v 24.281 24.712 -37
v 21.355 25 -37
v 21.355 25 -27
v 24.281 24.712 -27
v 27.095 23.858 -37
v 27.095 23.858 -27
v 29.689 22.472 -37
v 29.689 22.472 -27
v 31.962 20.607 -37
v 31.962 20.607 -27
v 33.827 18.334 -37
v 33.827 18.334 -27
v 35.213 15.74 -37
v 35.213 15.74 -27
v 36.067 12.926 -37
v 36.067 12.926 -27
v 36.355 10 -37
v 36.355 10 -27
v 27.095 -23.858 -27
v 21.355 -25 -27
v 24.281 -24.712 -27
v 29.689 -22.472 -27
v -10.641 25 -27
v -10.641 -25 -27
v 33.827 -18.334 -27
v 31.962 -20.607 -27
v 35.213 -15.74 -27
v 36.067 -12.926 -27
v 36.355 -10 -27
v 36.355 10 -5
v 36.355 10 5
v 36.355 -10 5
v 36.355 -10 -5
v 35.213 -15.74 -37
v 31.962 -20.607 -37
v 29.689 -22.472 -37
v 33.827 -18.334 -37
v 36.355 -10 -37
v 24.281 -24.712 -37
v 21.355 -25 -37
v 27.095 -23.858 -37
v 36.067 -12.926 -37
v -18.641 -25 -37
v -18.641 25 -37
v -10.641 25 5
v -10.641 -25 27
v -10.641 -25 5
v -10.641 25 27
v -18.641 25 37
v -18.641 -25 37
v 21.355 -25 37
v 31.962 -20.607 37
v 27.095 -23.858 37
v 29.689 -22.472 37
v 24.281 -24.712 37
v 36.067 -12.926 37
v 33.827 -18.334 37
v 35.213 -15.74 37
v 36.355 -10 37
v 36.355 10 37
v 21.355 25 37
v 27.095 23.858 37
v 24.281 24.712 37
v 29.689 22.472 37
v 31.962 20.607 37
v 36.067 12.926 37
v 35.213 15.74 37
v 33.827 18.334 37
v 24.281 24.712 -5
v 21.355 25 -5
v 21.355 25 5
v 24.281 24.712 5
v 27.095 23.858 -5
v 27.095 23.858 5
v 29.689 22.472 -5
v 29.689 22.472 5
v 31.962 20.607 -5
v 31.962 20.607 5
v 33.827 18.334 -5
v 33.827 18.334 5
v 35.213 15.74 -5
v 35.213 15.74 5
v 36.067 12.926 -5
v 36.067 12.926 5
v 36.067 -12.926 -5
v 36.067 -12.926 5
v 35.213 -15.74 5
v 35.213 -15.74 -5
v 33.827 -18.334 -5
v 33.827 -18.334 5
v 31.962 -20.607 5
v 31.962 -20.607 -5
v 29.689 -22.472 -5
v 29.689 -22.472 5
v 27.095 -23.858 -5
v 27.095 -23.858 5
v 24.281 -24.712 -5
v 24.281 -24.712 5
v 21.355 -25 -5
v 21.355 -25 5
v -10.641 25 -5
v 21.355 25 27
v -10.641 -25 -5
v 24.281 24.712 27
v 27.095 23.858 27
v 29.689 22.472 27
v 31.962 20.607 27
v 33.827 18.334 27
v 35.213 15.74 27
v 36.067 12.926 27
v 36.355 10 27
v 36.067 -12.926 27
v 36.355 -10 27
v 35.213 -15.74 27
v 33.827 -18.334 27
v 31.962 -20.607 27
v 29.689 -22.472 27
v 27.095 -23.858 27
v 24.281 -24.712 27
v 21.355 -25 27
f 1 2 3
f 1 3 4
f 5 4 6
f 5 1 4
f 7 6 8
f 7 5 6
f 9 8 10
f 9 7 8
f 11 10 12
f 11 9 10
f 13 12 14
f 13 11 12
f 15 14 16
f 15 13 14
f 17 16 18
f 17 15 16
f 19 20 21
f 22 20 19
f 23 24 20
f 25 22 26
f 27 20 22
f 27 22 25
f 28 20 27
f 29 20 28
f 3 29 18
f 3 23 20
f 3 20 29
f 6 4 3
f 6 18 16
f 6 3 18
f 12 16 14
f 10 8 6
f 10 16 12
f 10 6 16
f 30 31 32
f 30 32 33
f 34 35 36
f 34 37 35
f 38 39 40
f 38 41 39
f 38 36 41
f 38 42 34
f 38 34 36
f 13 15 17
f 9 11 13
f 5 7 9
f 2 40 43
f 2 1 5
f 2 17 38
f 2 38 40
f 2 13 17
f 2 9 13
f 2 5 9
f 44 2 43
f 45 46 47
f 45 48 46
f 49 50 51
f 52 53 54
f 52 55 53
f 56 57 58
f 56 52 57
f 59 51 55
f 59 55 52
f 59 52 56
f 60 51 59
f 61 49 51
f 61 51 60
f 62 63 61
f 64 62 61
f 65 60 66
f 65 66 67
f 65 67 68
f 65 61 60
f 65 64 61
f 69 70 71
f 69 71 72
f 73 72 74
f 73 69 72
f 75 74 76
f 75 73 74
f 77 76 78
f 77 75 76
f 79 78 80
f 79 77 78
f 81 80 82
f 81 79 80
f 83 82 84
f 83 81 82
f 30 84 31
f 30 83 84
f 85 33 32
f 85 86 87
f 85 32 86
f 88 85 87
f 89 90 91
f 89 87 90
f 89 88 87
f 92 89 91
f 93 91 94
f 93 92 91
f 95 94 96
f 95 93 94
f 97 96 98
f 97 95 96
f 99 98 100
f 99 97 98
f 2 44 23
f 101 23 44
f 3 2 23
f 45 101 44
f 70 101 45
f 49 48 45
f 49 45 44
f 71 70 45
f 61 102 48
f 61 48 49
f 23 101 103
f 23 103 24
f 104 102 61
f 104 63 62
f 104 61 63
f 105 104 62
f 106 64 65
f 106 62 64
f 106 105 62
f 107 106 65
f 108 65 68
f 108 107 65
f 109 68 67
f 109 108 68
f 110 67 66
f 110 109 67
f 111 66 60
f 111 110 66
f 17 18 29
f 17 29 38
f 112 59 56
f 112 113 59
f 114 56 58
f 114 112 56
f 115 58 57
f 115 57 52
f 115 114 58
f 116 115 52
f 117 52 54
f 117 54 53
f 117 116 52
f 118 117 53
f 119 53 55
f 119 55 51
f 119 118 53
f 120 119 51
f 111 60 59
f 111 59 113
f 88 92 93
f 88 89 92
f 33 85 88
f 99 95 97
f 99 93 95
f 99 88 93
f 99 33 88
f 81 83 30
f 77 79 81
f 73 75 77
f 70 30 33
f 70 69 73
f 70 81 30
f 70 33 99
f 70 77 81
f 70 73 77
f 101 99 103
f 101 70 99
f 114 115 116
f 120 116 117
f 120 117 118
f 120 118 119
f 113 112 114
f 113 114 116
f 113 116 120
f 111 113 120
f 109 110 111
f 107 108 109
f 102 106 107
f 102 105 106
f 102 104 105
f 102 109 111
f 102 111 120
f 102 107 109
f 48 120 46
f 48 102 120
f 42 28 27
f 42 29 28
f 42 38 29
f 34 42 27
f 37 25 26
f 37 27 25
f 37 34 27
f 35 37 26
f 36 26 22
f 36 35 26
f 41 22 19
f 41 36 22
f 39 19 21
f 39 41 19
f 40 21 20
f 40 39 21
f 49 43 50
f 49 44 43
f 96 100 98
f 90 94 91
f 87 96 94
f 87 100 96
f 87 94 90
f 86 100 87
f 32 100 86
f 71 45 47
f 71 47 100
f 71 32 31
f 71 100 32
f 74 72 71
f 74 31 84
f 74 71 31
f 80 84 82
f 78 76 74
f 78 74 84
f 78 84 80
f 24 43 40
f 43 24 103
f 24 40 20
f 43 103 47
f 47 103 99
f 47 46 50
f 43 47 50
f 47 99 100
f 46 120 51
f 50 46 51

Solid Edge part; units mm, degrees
sketch "Sketch1" plane through (0, 0, 0) normal (0, -1, 0) x (1, 0, 0)
  line L0 (36.3551, 37) -> (36.3551, 27)
  line L1 (36.3551, 27) -> (-10.6407, 27)
  line L2 (-10.6407, 27) -> (-10.6407, 5)
  line L3 (-10.6407, 5) -> (36.3551, 5)
  line L4 (36.3551, 5) -> (36.3551, -5)
  line L5 (36.3551, -5) -> (-10.6407, -5)
  line L6 (-10.6407, -5) -> (-10.6407, -27)
  line L7 (-10.6407, -27) -> (36.3551, -27)
  line L8 (36.3551, -27) -> (36.3551, -37)
  line L9 (36.3551, -37) -> (-18.6407, -37)
  line L10 (-18.6407, -37) -> (-18.6407, 37)
  line L11 (-18.6407, 37) -> (36.3551, 37)
  dimension "D1" = 22
  dimension "D2" = 10
  dimension "D3" = 8
extrude "Protrusion1" add sketch "Sketch1" along normal mid plane 50
fillet "Round_2" radius 15 6 edges at (36.3551, -25, 32) (36.3551, -25, 0) (36.3551, -25, -32) (36.3551, 25, -32) (36.3551, 25, 0) (36.3551, 25, 32)
